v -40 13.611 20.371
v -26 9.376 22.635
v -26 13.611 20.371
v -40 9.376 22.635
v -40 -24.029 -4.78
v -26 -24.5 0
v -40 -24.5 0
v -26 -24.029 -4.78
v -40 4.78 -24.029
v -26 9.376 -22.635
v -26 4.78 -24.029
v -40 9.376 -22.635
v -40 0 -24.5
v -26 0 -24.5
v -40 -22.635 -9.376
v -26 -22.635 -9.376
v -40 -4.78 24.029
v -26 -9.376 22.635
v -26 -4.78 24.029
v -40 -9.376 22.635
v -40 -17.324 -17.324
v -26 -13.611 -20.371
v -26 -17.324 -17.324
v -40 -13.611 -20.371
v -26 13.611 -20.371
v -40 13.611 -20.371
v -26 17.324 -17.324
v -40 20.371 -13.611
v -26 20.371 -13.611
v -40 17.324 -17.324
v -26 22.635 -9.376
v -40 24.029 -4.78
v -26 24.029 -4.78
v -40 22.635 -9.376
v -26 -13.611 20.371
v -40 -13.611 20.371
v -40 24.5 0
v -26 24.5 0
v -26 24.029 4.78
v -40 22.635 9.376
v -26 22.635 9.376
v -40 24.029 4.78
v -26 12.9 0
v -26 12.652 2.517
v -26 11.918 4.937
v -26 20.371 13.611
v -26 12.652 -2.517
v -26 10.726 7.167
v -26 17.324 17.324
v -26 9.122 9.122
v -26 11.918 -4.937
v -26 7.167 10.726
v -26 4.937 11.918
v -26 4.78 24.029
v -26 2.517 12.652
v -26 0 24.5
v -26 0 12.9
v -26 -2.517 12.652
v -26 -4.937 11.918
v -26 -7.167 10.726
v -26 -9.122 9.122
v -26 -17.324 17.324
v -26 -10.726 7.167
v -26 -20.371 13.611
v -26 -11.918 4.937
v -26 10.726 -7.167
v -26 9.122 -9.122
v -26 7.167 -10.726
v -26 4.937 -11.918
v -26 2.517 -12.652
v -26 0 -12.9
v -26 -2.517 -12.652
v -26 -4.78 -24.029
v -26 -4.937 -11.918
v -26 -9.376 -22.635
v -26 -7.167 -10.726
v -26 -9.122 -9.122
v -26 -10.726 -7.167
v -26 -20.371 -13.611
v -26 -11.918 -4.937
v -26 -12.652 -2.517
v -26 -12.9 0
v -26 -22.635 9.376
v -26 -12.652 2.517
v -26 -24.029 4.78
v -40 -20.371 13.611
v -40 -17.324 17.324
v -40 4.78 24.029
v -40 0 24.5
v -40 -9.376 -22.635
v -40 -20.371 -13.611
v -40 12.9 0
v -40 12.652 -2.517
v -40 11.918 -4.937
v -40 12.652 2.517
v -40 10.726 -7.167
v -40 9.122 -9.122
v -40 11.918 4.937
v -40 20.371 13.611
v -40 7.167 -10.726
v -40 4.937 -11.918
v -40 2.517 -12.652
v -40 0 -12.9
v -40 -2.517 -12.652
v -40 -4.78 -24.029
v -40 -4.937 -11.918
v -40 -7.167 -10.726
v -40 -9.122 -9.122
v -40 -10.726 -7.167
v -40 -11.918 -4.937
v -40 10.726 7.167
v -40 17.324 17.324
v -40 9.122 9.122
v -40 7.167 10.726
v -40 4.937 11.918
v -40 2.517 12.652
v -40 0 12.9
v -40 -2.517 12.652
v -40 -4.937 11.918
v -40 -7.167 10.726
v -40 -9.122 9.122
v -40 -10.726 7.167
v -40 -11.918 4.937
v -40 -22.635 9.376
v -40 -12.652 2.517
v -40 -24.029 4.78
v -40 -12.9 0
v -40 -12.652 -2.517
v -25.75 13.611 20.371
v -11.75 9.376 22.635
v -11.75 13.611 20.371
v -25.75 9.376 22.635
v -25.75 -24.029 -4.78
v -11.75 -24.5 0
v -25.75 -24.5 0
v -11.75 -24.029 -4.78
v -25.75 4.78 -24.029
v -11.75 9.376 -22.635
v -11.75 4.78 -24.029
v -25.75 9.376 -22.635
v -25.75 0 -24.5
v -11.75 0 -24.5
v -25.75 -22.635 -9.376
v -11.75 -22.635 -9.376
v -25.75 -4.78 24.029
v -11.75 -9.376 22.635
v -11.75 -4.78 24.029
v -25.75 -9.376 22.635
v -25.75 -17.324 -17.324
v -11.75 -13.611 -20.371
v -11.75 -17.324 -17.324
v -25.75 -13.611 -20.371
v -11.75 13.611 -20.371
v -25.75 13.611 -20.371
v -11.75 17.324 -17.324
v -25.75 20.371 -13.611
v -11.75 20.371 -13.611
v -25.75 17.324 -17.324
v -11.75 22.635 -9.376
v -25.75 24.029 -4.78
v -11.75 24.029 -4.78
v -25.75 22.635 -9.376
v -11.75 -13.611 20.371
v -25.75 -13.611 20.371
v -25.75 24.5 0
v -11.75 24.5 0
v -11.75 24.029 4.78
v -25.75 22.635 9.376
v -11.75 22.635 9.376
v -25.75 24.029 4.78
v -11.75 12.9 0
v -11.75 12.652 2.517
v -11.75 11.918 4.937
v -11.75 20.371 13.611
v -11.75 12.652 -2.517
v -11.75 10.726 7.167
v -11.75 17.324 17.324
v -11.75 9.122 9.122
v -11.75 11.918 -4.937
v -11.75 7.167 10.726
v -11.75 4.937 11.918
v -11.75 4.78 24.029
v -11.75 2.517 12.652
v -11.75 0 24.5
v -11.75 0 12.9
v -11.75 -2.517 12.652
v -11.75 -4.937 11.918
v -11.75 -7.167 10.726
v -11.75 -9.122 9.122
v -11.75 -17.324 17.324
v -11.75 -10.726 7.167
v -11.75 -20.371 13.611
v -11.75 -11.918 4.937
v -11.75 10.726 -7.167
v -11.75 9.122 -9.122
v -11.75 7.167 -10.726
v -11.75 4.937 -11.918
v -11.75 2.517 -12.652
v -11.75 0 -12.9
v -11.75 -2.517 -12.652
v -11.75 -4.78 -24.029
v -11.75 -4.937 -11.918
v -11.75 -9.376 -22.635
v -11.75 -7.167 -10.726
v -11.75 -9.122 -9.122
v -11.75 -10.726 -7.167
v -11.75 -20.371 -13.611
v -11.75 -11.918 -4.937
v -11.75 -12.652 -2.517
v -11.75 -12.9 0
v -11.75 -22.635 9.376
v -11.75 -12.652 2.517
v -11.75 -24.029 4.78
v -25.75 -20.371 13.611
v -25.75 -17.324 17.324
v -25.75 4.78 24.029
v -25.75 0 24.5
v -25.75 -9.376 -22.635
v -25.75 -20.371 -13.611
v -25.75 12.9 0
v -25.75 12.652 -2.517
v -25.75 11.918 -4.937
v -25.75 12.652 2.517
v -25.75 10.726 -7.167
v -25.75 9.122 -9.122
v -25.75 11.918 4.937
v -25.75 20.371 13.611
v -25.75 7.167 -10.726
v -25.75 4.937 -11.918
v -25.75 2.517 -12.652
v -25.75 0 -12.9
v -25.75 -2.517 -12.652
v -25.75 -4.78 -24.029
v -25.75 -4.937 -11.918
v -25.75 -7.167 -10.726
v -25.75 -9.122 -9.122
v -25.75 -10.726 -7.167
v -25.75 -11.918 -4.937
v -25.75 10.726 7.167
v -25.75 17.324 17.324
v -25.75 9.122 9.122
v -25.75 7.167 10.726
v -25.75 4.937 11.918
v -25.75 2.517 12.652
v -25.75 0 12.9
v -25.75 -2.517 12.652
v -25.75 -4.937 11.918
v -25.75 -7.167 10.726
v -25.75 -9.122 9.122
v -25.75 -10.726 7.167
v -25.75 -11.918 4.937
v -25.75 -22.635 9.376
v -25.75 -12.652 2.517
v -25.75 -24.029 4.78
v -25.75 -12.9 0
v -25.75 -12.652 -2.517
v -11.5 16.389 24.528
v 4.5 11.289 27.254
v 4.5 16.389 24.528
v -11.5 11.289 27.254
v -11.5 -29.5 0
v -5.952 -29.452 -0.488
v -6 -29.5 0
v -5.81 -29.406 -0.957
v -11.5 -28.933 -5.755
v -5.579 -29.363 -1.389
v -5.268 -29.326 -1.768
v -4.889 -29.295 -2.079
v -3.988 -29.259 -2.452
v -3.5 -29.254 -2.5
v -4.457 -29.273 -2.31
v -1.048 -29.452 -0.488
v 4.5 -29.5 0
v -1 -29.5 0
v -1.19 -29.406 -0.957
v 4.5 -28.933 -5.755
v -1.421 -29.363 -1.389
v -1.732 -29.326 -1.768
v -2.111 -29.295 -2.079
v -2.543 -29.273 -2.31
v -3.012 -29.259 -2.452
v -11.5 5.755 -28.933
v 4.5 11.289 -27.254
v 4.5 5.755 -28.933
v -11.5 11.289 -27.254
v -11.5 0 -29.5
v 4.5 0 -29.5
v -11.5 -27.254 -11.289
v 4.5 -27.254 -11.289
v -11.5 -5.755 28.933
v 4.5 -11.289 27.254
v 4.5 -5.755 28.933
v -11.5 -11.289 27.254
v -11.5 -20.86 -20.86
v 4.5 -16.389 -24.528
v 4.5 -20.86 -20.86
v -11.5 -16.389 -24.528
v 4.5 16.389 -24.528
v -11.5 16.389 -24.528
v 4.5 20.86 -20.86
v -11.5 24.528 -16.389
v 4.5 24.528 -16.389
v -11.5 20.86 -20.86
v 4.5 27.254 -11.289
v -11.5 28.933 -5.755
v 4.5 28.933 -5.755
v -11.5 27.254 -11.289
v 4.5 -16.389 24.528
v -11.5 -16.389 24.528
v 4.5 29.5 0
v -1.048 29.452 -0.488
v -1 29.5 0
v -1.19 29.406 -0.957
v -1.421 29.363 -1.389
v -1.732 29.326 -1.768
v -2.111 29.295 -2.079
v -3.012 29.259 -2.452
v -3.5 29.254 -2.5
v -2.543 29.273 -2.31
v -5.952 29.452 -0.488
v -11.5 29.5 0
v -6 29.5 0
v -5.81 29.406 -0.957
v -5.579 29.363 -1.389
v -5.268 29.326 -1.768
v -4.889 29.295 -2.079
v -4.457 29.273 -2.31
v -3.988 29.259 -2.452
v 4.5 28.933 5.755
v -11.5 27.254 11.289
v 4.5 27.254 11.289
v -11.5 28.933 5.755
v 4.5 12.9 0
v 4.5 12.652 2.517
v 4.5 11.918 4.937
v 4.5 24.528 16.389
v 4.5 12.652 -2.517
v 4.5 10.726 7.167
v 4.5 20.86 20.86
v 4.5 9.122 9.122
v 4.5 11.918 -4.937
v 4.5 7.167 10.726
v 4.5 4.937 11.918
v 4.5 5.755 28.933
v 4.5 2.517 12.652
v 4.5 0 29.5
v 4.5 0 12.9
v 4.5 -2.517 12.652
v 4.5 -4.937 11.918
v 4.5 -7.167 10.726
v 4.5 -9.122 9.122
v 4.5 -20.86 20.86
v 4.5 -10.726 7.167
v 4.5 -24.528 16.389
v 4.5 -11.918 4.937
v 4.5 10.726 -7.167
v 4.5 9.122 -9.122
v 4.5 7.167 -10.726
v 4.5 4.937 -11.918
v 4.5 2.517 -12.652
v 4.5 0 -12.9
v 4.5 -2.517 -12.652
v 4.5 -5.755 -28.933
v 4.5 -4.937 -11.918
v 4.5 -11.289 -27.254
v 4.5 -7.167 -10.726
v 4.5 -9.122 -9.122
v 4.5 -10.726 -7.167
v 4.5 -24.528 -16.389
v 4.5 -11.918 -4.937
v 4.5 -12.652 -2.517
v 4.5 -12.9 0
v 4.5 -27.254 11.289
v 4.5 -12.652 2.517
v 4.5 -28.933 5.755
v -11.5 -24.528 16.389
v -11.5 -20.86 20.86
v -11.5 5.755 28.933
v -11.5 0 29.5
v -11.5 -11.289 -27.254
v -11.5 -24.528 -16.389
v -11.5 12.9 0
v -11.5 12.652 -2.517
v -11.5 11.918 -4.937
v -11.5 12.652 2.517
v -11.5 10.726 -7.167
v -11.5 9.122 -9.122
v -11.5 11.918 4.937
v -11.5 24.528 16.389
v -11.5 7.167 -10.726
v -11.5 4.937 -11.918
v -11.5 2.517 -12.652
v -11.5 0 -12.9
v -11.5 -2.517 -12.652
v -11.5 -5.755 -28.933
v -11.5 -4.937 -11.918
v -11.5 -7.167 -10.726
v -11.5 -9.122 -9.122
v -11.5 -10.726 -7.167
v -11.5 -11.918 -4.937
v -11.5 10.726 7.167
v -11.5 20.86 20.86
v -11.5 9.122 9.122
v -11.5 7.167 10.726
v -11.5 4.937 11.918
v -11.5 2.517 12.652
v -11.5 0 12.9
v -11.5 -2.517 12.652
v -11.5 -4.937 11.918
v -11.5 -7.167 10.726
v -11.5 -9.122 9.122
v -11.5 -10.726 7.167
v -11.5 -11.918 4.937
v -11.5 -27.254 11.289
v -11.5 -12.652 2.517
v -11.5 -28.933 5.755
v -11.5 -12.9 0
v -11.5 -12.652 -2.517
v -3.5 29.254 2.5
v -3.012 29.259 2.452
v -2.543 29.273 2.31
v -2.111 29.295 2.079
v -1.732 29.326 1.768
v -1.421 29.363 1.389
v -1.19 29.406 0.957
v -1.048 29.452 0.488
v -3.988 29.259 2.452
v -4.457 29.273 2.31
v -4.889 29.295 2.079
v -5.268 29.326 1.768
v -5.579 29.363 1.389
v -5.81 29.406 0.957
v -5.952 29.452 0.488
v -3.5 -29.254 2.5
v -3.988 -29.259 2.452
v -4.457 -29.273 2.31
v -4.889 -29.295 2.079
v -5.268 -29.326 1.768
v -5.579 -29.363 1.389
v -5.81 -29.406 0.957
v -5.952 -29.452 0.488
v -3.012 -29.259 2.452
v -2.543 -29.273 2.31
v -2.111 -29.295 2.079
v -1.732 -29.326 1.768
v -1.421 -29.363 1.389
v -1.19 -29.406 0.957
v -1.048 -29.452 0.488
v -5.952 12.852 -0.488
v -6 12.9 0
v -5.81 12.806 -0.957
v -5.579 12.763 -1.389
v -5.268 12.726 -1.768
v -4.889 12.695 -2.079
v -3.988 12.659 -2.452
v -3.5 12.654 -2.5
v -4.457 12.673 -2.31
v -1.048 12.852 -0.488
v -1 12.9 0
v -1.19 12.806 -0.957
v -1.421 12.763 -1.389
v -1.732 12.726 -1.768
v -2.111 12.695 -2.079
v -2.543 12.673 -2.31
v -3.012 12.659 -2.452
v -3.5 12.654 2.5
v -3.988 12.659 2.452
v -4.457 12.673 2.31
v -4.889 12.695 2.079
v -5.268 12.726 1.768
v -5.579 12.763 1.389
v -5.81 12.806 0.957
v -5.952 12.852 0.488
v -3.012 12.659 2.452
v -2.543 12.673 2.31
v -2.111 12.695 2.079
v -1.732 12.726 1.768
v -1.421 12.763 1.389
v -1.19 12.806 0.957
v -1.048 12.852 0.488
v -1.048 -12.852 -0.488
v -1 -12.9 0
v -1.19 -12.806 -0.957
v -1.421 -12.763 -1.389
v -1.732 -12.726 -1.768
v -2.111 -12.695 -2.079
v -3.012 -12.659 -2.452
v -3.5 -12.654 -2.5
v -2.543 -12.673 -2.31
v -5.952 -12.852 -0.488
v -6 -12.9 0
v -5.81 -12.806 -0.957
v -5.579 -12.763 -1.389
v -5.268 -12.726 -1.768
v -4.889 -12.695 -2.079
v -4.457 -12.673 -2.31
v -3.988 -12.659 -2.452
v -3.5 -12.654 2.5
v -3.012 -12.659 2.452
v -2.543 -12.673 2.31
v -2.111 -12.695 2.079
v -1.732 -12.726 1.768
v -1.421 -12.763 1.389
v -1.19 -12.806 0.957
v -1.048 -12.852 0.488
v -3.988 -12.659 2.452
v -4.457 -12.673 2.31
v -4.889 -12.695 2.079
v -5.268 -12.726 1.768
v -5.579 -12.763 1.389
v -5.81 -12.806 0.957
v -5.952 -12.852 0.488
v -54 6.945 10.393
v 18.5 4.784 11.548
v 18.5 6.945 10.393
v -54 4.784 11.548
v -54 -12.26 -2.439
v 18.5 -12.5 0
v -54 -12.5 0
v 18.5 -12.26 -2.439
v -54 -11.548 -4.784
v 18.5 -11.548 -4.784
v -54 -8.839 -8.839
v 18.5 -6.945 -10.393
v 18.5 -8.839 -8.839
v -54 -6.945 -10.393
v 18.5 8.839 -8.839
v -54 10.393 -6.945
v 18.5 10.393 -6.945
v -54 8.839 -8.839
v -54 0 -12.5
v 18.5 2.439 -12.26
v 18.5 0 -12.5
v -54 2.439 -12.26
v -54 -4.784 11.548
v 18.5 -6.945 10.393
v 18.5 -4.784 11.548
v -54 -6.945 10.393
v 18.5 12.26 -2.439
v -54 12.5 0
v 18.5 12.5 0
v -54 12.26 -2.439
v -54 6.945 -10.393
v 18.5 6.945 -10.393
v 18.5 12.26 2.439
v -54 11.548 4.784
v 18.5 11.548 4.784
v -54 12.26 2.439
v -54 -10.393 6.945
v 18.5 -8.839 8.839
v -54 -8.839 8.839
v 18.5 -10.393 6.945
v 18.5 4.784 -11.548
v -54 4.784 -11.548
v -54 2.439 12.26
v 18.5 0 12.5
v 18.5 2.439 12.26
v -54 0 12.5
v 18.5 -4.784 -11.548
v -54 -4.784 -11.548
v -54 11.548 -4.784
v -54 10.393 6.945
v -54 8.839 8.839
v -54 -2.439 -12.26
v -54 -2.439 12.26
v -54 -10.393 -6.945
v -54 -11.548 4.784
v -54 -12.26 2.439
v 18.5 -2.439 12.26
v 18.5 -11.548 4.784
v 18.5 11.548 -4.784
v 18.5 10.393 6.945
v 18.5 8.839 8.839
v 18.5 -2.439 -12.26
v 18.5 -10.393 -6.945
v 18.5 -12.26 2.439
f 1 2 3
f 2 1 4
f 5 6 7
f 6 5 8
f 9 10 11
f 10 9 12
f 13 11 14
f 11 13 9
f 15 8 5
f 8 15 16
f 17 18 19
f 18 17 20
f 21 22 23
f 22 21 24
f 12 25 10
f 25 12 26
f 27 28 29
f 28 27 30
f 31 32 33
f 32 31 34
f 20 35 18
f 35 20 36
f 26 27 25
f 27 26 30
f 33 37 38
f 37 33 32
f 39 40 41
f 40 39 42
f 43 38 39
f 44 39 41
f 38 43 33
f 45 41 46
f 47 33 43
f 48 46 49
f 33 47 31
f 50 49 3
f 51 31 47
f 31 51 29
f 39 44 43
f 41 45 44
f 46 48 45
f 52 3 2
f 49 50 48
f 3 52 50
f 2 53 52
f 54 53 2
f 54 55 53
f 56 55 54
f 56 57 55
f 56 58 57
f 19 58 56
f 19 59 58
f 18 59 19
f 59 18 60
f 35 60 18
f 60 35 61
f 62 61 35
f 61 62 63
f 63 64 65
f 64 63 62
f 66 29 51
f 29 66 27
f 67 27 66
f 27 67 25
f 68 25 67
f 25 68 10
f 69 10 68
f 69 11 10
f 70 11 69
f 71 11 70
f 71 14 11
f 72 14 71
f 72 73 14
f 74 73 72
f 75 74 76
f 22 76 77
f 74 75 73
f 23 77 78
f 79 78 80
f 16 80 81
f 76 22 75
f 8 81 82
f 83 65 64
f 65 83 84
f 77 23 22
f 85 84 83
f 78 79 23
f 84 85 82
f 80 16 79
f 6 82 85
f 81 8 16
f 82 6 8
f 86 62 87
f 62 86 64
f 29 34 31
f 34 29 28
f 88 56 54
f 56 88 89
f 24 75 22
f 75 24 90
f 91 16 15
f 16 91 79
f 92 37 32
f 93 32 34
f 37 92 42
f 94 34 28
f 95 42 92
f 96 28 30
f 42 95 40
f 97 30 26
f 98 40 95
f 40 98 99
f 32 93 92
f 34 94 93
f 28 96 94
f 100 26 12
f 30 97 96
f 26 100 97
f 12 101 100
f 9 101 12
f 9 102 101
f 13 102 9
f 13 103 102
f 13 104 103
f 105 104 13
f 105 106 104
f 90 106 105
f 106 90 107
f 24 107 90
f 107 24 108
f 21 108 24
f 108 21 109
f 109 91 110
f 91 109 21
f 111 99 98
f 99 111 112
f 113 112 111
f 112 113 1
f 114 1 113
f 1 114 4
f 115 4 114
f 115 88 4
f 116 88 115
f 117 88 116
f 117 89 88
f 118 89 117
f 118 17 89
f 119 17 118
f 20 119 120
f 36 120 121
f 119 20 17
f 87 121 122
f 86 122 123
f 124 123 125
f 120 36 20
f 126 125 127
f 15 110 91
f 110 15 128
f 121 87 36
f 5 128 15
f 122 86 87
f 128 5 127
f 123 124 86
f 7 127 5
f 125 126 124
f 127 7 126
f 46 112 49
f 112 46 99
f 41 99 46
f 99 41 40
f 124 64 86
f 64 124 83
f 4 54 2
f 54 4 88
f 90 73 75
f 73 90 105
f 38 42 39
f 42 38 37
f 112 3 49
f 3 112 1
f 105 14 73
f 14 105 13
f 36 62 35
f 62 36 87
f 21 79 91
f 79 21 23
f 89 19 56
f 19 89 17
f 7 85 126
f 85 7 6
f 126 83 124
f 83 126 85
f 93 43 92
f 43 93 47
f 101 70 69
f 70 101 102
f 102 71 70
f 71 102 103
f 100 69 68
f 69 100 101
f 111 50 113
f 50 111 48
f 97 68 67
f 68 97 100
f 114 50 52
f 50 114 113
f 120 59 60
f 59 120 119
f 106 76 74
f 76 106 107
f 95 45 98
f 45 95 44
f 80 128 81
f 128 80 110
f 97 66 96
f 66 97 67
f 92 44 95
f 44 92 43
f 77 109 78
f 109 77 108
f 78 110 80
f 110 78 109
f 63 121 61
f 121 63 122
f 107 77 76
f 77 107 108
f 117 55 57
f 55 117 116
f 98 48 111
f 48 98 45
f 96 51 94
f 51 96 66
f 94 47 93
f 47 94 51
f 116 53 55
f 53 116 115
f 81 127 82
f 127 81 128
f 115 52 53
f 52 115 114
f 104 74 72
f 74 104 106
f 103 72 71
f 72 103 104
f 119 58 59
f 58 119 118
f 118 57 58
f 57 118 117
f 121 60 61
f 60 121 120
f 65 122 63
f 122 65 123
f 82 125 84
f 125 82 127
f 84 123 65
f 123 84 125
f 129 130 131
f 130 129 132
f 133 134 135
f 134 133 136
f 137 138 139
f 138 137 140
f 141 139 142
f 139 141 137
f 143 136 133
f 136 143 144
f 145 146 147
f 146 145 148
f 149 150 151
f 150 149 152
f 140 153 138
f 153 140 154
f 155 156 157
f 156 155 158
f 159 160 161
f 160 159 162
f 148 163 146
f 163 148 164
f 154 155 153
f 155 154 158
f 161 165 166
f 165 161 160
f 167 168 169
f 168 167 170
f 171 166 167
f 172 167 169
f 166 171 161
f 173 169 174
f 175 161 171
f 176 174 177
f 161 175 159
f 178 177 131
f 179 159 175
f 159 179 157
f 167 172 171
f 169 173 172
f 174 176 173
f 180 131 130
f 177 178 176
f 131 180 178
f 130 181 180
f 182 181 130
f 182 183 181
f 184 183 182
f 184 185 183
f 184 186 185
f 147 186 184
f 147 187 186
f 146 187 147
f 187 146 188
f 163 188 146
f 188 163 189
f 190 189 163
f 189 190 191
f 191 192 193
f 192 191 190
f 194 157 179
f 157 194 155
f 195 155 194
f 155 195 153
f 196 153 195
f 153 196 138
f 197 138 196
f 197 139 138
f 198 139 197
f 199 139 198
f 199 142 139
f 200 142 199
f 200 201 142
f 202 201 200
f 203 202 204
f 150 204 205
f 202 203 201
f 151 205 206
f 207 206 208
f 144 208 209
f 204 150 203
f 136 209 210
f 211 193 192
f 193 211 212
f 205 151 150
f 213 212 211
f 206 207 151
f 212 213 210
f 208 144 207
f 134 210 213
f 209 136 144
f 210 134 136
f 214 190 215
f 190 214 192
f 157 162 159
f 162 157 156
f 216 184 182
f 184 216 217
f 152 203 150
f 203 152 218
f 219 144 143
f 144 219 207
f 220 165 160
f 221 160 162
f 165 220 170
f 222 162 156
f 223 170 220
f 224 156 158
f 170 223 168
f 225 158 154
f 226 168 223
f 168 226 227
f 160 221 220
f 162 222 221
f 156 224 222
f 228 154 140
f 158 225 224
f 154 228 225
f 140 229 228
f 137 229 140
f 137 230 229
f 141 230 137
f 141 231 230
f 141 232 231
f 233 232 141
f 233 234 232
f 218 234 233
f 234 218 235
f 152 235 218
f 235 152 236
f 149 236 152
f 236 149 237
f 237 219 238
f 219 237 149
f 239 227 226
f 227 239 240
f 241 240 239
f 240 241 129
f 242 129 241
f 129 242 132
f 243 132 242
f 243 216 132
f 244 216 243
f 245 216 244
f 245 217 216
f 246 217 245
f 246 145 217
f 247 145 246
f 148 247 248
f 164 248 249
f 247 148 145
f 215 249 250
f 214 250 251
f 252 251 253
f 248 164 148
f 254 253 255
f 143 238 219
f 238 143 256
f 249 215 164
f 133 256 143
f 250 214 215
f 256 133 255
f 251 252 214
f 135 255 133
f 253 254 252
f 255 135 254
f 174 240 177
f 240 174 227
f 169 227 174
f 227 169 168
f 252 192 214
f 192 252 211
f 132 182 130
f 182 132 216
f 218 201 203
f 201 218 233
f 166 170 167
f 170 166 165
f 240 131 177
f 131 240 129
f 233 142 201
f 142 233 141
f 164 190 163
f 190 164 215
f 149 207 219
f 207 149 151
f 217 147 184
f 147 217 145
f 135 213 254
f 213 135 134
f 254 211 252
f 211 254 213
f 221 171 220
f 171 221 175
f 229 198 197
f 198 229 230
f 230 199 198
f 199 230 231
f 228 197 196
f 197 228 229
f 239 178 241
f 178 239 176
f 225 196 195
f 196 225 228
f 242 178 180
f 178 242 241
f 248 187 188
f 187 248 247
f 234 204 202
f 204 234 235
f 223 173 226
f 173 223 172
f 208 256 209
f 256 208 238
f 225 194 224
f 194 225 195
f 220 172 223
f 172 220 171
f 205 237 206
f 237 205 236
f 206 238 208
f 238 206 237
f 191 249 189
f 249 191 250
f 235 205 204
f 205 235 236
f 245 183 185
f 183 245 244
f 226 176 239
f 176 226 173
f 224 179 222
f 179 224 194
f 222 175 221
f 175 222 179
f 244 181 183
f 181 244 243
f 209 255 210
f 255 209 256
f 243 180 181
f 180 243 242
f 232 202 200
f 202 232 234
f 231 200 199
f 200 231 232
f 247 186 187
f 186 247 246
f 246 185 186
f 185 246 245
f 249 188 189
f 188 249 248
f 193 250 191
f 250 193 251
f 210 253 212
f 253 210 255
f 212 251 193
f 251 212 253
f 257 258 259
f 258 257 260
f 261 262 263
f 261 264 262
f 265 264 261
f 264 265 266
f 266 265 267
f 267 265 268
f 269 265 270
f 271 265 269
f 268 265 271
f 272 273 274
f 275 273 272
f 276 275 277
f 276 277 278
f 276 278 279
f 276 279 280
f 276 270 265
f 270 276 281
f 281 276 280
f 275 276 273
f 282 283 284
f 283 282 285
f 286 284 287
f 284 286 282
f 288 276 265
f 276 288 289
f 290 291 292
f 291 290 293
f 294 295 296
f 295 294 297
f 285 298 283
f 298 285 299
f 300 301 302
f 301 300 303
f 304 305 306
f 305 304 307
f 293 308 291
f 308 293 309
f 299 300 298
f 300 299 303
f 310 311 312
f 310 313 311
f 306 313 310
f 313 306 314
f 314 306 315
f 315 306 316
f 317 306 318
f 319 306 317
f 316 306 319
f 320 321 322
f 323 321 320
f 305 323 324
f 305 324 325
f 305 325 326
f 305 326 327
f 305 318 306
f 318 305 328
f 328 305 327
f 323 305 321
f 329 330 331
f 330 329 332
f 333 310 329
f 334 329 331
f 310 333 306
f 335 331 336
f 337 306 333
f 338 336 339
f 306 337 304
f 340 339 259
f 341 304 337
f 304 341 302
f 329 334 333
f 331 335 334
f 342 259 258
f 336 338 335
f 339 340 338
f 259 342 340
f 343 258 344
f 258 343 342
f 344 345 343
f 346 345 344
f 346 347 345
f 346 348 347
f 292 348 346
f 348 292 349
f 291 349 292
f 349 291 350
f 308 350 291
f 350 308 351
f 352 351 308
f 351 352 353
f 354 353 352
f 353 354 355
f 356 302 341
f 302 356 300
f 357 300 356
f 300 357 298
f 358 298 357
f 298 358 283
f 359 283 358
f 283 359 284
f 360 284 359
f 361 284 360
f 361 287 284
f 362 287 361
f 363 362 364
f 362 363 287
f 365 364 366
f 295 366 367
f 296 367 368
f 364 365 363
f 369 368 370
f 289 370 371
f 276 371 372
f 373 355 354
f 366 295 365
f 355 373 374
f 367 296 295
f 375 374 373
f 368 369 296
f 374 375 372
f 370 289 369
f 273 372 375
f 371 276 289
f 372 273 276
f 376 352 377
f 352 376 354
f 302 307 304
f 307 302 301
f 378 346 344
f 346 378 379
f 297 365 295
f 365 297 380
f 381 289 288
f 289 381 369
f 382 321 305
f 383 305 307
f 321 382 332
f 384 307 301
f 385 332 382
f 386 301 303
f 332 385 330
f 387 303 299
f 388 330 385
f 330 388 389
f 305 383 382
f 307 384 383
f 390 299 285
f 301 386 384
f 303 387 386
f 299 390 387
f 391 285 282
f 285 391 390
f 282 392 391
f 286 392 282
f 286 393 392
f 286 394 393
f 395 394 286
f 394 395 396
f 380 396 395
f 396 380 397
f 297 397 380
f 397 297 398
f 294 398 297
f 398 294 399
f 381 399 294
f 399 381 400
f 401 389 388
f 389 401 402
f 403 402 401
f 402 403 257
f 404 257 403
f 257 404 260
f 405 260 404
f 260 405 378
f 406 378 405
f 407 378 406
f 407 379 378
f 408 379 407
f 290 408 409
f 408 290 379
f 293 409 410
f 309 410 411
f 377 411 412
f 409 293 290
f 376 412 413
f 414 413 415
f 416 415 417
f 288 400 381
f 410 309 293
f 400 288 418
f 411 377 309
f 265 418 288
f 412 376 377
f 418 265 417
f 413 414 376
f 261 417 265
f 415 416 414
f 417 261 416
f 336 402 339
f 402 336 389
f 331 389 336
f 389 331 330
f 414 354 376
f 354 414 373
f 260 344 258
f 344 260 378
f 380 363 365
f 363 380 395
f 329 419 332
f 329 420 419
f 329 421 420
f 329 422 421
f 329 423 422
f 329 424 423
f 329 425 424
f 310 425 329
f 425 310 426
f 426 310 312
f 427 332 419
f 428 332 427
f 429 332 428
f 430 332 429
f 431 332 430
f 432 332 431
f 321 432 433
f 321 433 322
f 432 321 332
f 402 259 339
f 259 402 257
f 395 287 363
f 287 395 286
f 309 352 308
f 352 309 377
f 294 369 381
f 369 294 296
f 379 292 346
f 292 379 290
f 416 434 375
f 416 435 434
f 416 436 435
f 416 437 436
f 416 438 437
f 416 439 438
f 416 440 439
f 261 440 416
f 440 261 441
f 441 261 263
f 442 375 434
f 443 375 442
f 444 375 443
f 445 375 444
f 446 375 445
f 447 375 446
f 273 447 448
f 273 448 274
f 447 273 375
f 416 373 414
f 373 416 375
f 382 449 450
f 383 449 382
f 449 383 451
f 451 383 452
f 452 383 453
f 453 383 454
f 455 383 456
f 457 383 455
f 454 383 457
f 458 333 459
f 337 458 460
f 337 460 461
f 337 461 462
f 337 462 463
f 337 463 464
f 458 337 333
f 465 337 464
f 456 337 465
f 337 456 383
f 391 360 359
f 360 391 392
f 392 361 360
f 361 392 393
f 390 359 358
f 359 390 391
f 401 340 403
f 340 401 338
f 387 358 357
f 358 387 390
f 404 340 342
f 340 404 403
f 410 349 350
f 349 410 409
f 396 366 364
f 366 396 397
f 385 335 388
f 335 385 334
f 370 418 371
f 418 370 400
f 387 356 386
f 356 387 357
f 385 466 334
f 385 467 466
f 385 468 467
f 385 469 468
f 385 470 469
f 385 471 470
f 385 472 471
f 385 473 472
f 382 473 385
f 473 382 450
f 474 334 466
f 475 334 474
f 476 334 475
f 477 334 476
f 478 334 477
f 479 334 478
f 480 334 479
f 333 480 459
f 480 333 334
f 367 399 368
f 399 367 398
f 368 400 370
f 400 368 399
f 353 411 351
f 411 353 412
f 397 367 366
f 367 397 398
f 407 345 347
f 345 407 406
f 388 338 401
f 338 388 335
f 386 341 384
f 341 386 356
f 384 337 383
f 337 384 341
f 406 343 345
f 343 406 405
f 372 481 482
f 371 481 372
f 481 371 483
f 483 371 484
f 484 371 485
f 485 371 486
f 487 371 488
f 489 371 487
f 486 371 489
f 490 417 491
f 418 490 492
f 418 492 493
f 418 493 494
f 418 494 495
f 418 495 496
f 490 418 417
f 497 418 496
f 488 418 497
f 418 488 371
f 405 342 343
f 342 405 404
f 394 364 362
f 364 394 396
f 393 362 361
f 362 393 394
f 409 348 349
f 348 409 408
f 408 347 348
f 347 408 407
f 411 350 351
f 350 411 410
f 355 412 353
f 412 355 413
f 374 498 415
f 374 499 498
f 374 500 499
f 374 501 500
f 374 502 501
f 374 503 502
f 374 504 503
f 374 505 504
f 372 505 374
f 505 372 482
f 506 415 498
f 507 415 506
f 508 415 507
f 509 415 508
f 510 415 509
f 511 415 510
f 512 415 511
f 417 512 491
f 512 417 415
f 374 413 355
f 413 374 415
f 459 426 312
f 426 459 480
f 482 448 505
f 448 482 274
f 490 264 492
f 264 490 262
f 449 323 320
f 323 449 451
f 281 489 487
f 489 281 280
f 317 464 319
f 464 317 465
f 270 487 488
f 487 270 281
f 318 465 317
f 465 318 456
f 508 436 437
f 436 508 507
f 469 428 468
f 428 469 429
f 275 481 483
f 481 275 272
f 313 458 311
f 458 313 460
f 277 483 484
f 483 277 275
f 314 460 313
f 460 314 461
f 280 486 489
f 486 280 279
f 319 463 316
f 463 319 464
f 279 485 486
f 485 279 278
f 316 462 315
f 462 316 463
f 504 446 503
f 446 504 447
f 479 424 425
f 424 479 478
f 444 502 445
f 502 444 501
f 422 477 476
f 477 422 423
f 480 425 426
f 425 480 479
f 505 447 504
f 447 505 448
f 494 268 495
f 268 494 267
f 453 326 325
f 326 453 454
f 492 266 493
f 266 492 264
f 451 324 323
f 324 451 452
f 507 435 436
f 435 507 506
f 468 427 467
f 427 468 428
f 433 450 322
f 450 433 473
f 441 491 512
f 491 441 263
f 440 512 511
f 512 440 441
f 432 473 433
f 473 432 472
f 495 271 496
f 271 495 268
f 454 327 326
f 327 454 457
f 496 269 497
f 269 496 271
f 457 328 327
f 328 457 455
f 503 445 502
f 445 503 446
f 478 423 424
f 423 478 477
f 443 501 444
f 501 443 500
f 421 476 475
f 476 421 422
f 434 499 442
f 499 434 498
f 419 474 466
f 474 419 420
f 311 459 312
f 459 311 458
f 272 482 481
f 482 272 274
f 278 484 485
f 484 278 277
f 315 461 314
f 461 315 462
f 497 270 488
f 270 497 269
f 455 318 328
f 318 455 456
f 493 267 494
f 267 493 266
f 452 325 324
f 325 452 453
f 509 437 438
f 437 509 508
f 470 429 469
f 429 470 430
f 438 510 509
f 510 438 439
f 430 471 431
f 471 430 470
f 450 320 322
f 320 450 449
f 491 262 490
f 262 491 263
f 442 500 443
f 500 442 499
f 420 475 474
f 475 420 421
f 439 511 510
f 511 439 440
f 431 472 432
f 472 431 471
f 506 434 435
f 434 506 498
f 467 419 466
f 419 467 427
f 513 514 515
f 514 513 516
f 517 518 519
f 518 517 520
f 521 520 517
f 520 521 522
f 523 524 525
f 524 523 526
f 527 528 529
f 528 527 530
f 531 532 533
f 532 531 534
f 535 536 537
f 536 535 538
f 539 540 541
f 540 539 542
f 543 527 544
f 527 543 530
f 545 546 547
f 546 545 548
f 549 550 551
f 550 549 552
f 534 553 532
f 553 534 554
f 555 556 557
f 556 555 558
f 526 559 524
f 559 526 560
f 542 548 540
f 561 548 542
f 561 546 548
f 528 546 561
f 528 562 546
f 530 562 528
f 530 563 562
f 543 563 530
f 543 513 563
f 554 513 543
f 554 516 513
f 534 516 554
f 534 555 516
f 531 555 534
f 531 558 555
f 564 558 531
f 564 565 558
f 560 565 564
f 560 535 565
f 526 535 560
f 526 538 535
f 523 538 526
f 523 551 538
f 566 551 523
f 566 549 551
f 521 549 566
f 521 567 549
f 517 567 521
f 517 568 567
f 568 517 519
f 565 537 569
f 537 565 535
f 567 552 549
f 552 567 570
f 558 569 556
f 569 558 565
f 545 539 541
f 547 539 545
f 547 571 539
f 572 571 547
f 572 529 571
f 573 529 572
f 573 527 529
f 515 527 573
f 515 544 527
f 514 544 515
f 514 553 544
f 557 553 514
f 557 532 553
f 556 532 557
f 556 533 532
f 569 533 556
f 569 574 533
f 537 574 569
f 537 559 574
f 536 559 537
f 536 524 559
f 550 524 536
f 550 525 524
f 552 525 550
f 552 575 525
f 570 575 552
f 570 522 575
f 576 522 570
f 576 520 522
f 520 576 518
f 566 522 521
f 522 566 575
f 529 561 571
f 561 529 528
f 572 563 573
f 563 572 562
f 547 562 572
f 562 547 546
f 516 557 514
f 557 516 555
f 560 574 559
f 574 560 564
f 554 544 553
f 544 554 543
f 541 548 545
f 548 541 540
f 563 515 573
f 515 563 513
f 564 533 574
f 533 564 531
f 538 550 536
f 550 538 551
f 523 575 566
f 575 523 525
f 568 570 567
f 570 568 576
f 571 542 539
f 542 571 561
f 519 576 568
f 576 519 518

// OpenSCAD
$fn = 32;

// ------------------------------------------------------------------------
// Shaft with rings and collars: d25 shaft, 3 rings
// Every part is its own module, assembly() places them once.
// ------------------------------------------------------------------------

// --- part 1 ---
module shaft() {
  translate([0, 0, -36.25]) cylinder(h = 72.5, d = 25);
}

// --- part 2 ---
module spacer_a() {
  difference() {
      translate([0, 0, 0]) cylinder(h = 14, d = 49);
      translate([0, 0, -1]) cylinder(h = 16, d = 25.8);
    }
}

// --- part 3 ---
module spacer_b() {
  difference() {
      translate([0, 0, 0]) cylinder(h = 14, d = 49);
      translate([0, 0, -1]) cylinder(h = 16, d = 25.8);
    }
}

// --- part 4 ---
module collar_a() {
  difference() {
    cylinder(h = 16, d = 59);
    translate([0, 0, -1]) cylinder(h = 18, d = 25.8);
    translate([0, 0, 8]) rotate([90, 0, 0]) cylinder(h = 61, d = 5, center = true);
  }
}

// --- assembly ---
module assembly() {
  translate([-17.75, 0, 0]) rotate([0, 90, 0]) shaft();
  translate([-40, 0, 0]) rotate([0, 90, 0]) spacer_a();
  translate([-25.75, 0, 0]) rotate([0, 90, 0]) spacer_b();
  translate([-11.5, 0, 0]) rotate([0, 90, 0]) collar_a();
}

assembly();
